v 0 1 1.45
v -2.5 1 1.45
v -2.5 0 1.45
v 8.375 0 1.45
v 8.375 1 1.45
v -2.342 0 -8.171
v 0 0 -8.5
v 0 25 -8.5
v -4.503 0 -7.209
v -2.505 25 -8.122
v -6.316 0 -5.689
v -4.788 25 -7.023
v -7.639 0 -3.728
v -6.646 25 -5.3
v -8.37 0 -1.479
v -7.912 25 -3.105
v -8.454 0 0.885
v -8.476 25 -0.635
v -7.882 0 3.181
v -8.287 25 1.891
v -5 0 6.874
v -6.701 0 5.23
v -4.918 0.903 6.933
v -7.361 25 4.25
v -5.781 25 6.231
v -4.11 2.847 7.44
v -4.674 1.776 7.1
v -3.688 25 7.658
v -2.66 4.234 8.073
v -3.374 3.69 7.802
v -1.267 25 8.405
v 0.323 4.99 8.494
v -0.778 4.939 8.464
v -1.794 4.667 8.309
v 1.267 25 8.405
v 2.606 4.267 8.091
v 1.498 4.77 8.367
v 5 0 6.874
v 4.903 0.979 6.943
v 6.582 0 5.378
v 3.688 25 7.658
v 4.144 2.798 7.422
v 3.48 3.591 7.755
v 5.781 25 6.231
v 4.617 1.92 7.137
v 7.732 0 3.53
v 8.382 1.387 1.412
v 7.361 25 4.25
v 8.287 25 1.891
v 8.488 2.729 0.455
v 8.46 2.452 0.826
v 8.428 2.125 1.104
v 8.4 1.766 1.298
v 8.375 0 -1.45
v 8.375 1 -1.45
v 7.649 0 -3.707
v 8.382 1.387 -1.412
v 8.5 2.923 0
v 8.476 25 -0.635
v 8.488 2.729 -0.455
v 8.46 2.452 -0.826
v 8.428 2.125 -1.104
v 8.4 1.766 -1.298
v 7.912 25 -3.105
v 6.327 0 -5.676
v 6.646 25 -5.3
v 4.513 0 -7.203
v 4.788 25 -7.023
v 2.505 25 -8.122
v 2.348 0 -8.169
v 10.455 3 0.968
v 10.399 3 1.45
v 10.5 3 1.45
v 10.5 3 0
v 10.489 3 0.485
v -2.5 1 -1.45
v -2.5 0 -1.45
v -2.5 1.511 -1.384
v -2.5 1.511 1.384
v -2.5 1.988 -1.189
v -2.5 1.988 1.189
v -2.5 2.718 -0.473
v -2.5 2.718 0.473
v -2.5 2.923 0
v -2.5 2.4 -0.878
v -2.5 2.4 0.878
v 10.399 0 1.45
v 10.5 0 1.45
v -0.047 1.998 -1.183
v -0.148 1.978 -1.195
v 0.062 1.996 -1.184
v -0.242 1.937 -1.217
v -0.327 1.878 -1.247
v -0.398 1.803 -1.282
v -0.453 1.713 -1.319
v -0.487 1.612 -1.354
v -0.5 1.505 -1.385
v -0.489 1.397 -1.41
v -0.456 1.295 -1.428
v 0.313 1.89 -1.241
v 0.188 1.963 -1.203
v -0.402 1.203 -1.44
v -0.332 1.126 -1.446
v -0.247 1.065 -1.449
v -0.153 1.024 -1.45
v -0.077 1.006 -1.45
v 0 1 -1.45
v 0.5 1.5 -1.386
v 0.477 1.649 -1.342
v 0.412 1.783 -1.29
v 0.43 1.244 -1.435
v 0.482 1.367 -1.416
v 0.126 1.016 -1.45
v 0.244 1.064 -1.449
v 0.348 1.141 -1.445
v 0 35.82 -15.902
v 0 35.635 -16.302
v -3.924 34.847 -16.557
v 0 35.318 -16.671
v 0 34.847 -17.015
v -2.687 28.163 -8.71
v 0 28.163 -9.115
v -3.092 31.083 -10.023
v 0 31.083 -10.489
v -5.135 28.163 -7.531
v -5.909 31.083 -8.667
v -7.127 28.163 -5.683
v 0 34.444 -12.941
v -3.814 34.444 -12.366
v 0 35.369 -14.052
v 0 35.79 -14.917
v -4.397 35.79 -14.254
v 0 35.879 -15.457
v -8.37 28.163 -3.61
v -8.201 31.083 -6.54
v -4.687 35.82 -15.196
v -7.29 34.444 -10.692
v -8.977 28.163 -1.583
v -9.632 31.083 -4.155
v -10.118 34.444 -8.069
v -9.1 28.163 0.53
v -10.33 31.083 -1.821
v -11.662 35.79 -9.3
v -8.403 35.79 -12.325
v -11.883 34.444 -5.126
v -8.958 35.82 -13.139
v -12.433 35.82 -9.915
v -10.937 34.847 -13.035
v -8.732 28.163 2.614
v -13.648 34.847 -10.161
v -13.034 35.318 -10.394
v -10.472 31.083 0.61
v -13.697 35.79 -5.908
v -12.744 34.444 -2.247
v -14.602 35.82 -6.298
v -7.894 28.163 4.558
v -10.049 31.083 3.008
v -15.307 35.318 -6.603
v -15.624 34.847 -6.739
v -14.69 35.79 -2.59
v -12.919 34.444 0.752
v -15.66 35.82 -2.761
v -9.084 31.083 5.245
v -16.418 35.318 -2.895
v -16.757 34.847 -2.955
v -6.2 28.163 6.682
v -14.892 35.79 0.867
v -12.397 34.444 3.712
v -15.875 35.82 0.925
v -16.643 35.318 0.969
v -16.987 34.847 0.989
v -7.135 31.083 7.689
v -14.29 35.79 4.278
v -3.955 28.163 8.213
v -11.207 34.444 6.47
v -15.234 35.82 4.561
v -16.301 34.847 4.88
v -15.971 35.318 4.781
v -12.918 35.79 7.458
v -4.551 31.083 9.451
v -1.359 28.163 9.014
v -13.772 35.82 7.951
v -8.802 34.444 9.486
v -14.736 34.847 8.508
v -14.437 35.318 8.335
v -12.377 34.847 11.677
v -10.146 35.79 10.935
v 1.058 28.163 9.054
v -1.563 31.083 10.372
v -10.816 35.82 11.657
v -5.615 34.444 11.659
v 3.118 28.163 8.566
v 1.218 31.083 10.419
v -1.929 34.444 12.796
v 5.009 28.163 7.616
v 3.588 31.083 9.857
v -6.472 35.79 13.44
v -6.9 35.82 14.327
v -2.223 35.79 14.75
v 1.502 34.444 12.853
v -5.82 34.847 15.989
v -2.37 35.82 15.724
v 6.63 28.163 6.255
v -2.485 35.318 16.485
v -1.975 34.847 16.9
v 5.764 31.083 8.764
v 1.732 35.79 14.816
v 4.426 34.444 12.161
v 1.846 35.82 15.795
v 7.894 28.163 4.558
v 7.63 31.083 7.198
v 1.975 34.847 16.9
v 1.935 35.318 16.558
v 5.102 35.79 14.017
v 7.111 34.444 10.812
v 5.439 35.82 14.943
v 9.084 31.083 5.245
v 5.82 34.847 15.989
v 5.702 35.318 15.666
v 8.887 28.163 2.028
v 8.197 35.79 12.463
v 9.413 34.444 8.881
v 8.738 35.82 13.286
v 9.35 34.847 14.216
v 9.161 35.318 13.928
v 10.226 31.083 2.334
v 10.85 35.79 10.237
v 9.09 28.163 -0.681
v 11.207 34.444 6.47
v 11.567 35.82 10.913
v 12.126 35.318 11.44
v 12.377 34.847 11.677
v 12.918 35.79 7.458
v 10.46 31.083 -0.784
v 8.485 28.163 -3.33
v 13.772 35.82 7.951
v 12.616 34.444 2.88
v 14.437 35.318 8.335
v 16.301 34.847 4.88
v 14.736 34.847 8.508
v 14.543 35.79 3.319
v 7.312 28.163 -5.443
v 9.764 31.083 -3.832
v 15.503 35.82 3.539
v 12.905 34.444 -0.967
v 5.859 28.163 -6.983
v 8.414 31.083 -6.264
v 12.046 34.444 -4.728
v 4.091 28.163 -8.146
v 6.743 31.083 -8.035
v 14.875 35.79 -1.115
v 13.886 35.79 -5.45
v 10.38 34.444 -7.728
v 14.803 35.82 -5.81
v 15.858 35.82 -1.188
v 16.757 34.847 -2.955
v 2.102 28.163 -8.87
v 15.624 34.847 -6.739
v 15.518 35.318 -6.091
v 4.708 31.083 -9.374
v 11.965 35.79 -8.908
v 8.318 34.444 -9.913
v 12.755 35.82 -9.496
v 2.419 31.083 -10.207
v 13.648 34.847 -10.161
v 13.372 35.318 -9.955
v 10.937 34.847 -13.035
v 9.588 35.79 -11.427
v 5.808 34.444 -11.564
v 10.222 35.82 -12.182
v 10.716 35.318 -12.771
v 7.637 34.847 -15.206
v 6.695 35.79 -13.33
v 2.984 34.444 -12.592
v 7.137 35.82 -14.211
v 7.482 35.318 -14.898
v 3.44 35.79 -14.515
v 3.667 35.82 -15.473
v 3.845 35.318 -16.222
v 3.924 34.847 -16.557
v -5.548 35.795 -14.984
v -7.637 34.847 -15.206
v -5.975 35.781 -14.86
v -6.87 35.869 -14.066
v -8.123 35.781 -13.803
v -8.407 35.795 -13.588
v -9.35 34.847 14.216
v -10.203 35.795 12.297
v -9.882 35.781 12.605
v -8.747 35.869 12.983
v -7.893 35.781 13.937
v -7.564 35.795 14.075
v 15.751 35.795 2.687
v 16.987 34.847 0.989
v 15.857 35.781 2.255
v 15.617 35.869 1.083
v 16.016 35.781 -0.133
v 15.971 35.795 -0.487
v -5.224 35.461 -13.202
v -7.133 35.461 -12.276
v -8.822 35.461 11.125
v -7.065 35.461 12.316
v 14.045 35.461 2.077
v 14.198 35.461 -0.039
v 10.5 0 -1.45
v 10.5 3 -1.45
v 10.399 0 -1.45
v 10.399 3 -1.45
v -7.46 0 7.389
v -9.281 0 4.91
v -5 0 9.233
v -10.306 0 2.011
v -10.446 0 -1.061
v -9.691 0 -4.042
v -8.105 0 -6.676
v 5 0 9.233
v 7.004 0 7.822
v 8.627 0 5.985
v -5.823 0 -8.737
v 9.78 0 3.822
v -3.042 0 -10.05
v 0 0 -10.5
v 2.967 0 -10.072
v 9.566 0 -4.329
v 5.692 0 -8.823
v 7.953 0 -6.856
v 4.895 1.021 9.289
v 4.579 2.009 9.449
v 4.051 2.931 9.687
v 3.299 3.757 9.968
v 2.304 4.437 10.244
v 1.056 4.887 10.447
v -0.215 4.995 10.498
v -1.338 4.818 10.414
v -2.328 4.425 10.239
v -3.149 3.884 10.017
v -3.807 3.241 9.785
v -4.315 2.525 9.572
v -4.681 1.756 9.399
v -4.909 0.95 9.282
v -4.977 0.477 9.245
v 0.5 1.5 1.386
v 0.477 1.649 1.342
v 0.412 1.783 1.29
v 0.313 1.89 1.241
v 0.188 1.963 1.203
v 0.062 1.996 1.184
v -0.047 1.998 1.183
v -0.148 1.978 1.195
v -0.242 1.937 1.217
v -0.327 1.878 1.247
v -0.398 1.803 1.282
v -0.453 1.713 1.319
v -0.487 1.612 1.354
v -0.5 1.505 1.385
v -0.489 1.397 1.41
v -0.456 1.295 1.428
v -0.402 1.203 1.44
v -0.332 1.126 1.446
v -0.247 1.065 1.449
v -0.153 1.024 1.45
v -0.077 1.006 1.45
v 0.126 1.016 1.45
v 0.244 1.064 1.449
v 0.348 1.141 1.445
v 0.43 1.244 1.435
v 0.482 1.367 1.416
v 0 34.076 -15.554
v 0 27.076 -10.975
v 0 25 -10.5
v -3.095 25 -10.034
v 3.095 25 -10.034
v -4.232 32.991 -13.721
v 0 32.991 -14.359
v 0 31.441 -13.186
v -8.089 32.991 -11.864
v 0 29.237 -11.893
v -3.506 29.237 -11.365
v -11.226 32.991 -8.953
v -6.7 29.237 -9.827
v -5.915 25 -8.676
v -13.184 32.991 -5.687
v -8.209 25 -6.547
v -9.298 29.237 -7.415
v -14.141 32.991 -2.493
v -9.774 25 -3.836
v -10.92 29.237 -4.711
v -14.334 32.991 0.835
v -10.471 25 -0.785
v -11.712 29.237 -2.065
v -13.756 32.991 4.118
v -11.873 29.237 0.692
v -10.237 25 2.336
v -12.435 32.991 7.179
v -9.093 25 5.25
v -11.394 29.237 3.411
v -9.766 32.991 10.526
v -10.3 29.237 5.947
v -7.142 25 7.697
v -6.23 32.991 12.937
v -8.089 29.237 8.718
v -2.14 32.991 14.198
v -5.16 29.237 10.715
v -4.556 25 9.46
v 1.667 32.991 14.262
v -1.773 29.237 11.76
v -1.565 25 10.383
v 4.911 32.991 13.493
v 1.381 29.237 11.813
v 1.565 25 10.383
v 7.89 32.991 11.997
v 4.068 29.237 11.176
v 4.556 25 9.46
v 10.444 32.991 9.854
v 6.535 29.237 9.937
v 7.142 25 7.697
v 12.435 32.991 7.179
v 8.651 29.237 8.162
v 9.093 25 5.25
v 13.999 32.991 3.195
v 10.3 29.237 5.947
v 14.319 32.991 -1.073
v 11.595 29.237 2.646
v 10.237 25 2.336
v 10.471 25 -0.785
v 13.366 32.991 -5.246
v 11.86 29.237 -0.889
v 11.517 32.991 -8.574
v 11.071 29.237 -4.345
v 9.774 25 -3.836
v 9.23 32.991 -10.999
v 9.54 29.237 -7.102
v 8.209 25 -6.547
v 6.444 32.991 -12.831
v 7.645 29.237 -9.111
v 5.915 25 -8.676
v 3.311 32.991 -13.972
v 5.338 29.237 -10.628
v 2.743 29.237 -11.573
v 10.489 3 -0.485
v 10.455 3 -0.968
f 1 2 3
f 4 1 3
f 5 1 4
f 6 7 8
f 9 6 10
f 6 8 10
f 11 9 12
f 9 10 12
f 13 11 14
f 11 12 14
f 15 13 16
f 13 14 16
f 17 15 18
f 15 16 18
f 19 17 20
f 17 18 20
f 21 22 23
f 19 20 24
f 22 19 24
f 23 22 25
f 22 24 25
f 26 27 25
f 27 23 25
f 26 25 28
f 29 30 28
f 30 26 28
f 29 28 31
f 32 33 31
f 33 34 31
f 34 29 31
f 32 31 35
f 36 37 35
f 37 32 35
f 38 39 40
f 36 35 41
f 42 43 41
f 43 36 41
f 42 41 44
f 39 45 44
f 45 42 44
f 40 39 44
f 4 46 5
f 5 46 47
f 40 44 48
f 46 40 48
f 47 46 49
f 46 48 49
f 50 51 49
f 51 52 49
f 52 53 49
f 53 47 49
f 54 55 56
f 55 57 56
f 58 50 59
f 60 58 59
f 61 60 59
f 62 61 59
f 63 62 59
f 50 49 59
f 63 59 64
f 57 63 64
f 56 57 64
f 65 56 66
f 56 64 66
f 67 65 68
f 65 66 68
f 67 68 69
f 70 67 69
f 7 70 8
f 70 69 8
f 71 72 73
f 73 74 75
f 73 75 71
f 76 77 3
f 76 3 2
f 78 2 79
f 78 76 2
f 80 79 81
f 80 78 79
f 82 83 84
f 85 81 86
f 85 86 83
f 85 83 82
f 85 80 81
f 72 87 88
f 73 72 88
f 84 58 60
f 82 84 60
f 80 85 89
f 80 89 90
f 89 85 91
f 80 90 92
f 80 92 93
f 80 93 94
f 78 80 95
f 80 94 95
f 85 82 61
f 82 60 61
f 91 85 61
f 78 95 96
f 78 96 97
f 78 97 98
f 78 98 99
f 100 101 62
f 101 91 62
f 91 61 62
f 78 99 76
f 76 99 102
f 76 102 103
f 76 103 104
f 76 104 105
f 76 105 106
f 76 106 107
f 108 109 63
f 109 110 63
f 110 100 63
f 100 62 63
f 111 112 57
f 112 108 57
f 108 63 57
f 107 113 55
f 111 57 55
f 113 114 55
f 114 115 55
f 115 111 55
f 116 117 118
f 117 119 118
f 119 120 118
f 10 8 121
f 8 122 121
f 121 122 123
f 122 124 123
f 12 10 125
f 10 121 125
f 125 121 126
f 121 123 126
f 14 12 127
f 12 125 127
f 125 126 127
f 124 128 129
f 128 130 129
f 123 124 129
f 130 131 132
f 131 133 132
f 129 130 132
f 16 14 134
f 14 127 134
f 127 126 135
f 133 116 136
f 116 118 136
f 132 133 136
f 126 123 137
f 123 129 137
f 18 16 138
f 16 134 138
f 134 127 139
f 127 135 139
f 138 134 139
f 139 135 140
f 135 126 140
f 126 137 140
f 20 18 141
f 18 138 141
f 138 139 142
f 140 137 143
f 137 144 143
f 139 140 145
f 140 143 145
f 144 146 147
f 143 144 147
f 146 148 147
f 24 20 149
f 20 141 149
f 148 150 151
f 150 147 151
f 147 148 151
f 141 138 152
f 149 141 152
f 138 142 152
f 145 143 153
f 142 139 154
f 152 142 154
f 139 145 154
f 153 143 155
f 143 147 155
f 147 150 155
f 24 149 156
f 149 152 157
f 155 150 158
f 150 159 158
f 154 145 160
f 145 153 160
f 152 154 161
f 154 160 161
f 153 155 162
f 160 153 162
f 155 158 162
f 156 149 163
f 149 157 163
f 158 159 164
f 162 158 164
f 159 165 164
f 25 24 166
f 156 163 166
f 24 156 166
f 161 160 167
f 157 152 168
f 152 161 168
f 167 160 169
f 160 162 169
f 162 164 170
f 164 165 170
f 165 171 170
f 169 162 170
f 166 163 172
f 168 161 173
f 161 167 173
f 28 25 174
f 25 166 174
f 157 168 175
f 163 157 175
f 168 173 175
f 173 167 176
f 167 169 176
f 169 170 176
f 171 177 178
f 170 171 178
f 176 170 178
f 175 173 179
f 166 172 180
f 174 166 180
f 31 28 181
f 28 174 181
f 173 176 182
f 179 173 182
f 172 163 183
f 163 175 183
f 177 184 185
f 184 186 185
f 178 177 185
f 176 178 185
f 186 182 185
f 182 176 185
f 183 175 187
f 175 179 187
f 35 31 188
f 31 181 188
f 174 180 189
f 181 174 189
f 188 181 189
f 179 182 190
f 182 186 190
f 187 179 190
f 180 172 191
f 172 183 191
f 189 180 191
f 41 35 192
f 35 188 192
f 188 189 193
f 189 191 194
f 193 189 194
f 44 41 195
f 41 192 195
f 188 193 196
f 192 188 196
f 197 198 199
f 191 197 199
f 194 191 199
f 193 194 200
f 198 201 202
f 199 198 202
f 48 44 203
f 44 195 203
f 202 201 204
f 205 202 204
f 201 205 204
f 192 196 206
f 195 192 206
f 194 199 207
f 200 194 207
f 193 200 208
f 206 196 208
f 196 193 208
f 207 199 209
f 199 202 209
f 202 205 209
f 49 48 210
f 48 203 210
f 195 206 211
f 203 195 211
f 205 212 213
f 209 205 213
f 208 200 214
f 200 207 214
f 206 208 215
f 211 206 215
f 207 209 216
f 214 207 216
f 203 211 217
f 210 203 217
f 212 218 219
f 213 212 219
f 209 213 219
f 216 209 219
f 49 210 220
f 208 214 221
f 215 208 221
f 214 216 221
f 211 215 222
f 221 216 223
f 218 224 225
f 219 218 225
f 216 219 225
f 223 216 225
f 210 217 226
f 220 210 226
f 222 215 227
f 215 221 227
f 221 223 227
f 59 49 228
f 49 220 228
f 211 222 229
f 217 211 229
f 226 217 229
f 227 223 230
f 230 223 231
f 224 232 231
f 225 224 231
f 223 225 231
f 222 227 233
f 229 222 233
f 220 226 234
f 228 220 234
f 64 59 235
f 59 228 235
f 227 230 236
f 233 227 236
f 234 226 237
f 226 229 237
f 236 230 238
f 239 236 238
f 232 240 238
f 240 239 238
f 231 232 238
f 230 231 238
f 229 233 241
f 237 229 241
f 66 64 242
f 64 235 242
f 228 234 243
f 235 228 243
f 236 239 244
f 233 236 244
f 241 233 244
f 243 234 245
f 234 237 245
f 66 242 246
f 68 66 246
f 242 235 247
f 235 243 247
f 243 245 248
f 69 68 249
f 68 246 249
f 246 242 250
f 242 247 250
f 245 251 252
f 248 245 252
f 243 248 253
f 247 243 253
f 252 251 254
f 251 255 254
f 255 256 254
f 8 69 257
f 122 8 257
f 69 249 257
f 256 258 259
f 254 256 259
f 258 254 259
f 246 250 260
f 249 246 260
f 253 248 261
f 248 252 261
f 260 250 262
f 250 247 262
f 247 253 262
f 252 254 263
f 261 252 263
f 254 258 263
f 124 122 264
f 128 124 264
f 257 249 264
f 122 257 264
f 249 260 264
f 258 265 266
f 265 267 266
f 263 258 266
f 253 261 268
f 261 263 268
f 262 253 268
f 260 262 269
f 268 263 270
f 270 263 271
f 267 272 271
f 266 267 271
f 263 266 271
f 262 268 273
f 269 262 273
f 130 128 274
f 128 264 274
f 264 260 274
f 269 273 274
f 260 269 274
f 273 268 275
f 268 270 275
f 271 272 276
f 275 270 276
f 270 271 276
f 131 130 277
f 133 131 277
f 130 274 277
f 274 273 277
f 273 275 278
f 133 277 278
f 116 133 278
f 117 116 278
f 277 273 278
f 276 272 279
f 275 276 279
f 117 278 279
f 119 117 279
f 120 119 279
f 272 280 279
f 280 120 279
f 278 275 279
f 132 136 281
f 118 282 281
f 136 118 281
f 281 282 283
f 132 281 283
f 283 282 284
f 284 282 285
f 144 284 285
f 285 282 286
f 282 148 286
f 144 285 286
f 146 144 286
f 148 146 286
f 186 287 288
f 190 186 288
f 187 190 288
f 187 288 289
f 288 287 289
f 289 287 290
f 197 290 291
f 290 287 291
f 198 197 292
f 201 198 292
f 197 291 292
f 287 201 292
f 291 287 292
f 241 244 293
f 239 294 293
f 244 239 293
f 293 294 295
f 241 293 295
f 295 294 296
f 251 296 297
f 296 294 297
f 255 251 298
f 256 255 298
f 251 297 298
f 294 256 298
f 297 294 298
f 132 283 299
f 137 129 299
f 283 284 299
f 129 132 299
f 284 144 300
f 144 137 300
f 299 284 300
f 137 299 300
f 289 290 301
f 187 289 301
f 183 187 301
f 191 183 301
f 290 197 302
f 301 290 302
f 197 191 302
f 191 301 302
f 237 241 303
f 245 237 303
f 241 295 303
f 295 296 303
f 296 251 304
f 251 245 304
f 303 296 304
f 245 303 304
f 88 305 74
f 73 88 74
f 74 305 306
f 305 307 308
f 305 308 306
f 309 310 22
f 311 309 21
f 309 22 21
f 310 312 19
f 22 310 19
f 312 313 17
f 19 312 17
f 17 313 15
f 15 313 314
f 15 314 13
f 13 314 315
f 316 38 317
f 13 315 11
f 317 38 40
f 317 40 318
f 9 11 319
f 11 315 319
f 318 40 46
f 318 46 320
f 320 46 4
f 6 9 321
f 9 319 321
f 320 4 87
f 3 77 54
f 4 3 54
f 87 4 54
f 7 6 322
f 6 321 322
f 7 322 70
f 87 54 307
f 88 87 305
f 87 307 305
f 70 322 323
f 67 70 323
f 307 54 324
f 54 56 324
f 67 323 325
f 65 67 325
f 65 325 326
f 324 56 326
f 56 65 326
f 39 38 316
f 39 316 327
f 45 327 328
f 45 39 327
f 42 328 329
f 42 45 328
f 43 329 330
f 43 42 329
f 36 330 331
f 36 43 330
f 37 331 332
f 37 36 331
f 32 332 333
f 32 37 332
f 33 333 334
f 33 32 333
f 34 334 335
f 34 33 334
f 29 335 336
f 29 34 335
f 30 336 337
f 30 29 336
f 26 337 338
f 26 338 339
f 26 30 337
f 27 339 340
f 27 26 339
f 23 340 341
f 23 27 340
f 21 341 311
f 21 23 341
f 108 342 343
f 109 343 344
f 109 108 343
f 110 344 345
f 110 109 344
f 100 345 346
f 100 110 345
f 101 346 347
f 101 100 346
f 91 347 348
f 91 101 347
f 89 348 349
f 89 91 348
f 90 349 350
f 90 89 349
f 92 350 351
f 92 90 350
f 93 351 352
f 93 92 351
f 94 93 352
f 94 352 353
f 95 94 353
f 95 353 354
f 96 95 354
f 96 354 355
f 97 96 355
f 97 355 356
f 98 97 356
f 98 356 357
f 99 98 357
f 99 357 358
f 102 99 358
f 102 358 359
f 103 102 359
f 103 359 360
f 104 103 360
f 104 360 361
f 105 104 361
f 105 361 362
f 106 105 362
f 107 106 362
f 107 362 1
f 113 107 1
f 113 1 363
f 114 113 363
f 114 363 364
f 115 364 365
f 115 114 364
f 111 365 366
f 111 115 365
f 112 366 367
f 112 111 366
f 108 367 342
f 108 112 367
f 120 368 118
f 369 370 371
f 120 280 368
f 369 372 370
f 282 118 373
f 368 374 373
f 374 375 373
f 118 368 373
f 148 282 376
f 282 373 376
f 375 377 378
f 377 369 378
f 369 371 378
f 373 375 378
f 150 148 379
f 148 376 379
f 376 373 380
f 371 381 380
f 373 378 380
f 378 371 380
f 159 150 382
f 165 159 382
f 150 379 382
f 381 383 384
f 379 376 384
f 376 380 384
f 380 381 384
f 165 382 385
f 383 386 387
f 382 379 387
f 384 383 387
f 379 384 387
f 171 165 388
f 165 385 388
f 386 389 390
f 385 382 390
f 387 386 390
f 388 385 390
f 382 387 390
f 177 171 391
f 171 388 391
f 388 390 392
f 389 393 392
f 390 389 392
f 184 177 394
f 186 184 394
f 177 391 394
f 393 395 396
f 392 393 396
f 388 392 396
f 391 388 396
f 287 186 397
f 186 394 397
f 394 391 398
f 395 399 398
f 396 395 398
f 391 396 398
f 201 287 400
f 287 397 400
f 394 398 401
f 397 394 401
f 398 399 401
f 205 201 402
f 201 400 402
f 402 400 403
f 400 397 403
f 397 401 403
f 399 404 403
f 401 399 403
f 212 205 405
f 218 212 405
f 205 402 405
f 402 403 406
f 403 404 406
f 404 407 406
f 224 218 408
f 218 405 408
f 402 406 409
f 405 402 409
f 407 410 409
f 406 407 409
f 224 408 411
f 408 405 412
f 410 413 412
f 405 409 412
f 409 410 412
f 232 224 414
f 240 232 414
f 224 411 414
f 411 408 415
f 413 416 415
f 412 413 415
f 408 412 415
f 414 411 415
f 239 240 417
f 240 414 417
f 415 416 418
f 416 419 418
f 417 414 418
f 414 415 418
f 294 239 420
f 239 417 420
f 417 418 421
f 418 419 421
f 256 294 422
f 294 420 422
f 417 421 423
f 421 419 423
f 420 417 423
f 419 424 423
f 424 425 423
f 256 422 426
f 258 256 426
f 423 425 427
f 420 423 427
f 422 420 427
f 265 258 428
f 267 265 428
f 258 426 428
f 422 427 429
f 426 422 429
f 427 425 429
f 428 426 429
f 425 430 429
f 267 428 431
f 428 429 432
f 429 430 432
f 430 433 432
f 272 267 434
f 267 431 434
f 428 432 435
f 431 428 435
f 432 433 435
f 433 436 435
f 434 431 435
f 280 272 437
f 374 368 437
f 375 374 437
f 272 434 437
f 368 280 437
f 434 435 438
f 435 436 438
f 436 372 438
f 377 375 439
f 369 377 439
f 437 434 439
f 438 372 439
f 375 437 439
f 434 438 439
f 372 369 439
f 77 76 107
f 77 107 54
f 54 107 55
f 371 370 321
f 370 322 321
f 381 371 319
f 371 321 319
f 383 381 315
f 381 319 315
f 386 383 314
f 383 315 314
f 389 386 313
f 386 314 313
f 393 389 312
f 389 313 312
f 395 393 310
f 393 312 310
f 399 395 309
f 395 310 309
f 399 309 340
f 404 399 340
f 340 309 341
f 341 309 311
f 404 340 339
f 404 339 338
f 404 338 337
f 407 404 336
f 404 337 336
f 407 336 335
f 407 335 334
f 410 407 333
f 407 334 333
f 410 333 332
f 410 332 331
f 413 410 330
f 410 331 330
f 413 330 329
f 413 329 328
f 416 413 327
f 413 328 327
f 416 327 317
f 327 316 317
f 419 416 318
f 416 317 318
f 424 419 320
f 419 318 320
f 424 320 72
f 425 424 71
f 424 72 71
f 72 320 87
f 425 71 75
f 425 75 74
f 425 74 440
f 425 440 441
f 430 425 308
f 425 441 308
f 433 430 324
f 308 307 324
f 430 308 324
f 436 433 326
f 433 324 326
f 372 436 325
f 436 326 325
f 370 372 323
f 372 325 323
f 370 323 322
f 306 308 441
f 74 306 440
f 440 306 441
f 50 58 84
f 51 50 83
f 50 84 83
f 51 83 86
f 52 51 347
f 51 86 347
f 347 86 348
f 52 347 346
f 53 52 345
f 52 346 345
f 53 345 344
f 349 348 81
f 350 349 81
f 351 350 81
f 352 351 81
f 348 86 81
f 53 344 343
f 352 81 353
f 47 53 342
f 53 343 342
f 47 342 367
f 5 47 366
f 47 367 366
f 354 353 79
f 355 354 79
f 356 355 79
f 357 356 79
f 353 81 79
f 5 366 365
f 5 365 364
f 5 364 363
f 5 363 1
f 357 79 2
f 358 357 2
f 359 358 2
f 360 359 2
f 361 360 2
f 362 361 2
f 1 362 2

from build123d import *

# Parameters (mm, degrees)
BOSS_EXTRUDE1_DEPTH      = 1.45
BOSS_EXTRUDE1_DEPTH_BACK = 1.45
SKETCH3_W                = 13
SKETCH3_H                = 3
SKETCH3_R                = 0.5
SKETCH4_R                = 5
CUT_EXTRUDE1_DEPTH       = 20
FILLET1_R                = 2


with BuildPart() as part:
    # Sketch1 → Revolve1 (revolve)
    with BuildSketch(Plane.XY, mode=Mode.PRIVATE) as revolve1_sk:
        with BuildLine():
            Line((-8.5, 0), (-8.5, 25))
            add(Edge.make_bspline(
                [(-8.5, 25), (-8.597015347, 26.01504006), (-8.907000797, 27.967323593), (-10.203463046, 30.716511268), (-11.74686042, 33.10560974), (-13.777222786, 35.500816023), (-16.044814471, 36.474123076), (-17.015460227, 34.847167716)],
                knots=[0, 0, 0, 0, 0.199432853, 0.381102799, 0.589074274, 0.751073338, 1, 1, 1, 1], degree=3))
            add(Edge.make_bspline(
                [(-17.015460227, 34.847167716), (-15.061693604, 34.149149549), (-12.546917313, 30.799465382), (-10.772360994, 27.13941137), (-10.5, 25)],
                knots=[0, 0, 0, 0, 0.483303416, 1, 1, 1, 1], degree=3))
            Line((-10.5, 25), (-10.5, 0))
            Line((-10.5, 0), (-8.5, 0))
        make_face()
    revolve(revolve1_sk.sketch.rotate(Axis((0, 0, 0), (0, 1, 0)), 270), axis=Axis((0, 0, 0), (0, 1, 0)))

    # Sketch3 → Boss-Extrude1 (add, two sides: drawn at the far end of the back side and taken through both)
    with BuildSketch(Plane.XY.offset(-BOSS_EXTRUDE1_DEPTH_BACK)):
        with Locations((4, 1.5)):
            Rectangle(SKETCH3_W, SKETCH3_H)
        with Locations((0, 1.5)):
            Circle(SKETCH3_R, mode=Mode.SUBTRACT)
    extrude(amount=BOSS_EXTRUDE1_DEPTH + BOSS_EXTRUDE1_DEPTH_BACK)

    # Sketch4 → Cut-Extrude1 (cut)
    with BuildSketch(Plane.XY.offset(1.45)):
        Circle(SKETCH4_R)
    extrude(amount=CUT_EXTRUDE1_DEPTH, mode=Mode.SUBTRACT)

    # Fillet1
    # the kernel refuses this fillet: 2 mm, written as the material it takes off along each edge
    with BuildSketch(Plane(origin=(13.375410438, 3, -1.45), x_dir=(0, 0, 1), z_dir=(-1, 0, 0))) as fillet1_piece_1_section:
        with BuildLine():
            CenterArc((FILLET1_R, -FILLET1_R), FILLET1_R, 90, 90)
            Line((0, -FILLET1_R), (0, 0))
            Line((0, 0), (FILLET1_R, 0))
        make_face()
    fillet1_piece_1 = extrude(amount=20.875410438, mode=Mode.PRIVATE)
    fillet1_piece_1 = fillet1_piece_1 & Plane(origin=(0, 2.559869682, 0), x_dir=(0, 0, -1), z_dir=(0, 1, 0)) * Cylinder(8.5, 50, mode=Mode.PRIVATE)
    add(fillet1_piece_1, mode=Mode.SUBTRACT)
    with BuildSketch(Plane(origin=(-7.5, 3, 1.45), x_dir=(0, -1, 0), z_dir=(1, 0, 0))) as fillet1_piece_2_section:
        with BuildLine():
            CenterArc((FILLET1_R, FILLET1_R), FILLET1_R, 180, 90)
            Line((0, FILLET1_R), (0, 0))
            Line((0, 0), (FILLET1_R, 0))
        make_face()
    fillet1_piece_2 = extrude(amount=20.875410438, mode=Mode.PRIVATE)
    fillet1_piece_2 = fillet1_piece_2 & Plane(origin=(0, 2.559861322, 0), x_dir=(0, 0, -1), z_dir=(0, 1, 0)) * Cylinder(8.5, 50, mode=Mode.PRIVATE)
    add(fillet1_piece_2, mode=Mode.SUBTRACT)


solid = part.part
